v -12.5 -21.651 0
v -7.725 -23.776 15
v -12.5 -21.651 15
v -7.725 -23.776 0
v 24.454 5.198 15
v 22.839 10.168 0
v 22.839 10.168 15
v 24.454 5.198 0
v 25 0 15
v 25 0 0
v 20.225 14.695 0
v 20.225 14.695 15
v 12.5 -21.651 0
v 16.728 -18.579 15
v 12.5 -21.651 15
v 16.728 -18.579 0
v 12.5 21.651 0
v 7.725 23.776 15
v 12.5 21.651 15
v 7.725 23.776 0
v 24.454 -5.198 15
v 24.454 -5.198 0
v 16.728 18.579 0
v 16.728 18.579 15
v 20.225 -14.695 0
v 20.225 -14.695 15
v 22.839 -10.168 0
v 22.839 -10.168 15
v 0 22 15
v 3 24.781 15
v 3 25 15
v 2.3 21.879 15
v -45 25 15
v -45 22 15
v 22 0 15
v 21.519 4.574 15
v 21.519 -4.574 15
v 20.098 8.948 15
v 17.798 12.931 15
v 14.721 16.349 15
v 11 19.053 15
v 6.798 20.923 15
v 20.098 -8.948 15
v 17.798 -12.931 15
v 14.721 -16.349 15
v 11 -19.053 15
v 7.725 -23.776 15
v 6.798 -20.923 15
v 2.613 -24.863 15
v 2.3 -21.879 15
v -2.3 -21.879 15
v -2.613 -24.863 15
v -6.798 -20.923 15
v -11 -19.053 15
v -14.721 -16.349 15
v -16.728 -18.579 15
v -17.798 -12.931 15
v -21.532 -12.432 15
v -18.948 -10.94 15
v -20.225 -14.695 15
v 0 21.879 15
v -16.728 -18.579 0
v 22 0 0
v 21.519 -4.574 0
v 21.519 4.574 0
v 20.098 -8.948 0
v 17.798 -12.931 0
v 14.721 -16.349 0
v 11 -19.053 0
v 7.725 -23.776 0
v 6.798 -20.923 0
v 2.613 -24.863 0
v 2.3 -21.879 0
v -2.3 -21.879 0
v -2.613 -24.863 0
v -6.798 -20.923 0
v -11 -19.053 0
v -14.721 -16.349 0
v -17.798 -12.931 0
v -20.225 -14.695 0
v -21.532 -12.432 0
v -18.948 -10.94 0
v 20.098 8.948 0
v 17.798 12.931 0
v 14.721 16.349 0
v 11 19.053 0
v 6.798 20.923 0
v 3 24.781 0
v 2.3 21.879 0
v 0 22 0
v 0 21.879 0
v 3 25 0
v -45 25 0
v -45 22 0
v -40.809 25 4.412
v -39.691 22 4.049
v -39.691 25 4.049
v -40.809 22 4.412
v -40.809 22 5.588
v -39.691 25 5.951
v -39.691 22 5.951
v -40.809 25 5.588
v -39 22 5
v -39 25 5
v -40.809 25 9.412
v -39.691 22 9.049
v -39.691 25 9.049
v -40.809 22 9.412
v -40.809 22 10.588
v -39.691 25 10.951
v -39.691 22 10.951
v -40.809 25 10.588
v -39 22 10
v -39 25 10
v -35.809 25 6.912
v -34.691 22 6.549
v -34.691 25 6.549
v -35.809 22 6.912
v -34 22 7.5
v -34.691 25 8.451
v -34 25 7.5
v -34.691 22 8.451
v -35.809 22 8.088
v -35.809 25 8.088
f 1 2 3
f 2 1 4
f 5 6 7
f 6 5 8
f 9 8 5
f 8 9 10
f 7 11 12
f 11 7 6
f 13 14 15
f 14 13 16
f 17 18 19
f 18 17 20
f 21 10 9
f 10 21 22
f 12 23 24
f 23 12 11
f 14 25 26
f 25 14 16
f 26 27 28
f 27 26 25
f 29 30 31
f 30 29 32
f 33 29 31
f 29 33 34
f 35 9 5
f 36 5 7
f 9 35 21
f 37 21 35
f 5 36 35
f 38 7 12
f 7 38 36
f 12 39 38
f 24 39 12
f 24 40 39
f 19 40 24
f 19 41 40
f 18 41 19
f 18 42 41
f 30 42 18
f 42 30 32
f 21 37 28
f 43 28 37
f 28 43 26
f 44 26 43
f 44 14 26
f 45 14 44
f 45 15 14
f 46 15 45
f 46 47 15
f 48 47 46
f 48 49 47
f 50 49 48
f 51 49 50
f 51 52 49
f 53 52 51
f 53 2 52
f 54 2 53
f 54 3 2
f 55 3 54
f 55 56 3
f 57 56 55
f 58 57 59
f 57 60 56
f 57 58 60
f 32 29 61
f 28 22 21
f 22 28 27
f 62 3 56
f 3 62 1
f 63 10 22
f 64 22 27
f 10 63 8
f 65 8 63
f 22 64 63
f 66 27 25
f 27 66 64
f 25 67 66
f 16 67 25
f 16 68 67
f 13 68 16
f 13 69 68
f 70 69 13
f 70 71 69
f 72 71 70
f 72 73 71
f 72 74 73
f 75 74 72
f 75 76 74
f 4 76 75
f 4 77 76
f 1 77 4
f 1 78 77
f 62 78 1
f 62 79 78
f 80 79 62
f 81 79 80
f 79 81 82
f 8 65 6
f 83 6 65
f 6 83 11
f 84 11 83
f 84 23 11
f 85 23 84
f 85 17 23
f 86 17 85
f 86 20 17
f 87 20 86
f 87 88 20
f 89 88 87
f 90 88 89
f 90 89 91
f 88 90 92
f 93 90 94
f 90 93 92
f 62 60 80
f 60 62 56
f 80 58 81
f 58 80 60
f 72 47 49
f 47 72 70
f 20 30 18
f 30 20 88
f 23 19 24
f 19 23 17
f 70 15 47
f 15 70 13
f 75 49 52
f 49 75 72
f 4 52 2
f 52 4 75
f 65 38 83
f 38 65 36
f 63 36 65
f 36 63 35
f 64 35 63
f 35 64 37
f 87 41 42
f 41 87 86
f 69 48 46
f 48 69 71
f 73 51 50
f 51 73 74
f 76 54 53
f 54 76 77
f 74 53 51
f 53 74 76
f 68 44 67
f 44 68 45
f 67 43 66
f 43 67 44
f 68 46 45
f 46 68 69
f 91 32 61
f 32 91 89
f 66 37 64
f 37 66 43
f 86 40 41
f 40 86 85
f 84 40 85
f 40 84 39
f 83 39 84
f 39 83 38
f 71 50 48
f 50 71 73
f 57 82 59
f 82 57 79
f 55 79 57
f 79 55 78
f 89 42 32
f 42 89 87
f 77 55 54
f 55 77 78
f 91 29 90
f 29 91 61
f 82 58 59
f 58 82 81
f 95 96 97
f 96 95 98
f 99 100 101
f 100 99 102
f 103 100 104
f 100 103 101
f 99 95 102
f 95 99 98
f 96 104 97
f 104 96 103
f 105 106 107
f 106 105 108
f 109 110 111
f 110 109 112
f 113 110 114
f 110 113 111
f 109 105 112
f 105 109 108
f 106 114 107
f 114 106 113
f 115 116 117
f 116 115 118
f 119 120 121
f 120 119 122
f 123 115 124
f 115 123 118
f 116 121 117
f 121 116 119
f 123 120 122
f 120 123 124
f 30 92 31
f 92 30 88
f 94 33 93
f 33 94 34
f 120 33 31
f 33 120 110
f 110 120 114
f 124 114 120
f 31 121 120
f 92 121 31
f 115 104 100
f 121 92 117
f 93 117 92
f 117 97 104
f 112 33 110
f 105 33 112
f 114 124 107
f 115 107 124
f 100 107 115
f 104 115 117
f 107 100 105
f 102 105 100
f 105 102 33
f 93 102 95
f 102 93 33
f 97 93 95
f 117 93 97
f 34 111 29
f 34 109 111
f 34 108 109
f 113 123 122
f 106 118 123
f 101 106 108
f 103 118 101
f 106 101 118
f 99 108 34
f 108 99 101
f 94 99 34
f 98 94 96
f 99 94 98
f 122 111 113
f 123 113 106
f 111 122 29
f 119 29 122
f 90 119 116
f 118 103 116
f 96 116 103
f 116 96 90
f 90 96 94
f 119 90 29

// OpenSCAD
// Hook type: 1 = wall, 2 = desk
part = 1; // [1,2]

// Overall hook thickness
thickness = 3; // [1:10]
// Width of the hook
depth = 15; // [10:50]
// Hook inner radius
radius = 25; // [10:100]
// How long to make the mounting tabs
tabs = 45; // [20:100]

// For a wall hook, the radius of the nail holes
nails = 1; // [0:4]

// For a desk hook, how thick the desk is
height=25; // [10:50]


// The hook itself
difference() {
    cylinder(r=radius,h=depth);
    translate([0,0,-1]) cylinder(r=radius-thickness,h=depth+2);
    translate([-radius,0,-1]) cube([radius,radius+thickness,depth+2]);
    rotate([0,0,30]) translate([-radius,0,-1]) cube([radius,radius+thickness,depth+2]);
}

// Hook's tab
difference() {
    translate([-tabs,radius-thickness,0]) cube([tabs+thickness,thickness,depth]);
    if (part == 1) {
        translate([-tabs + 5, radius + 5, depth/3]) rotate([90,0,0]) cylinder(r=nails,h=10);
        translate([-tabs + 5, radius + 5, depth*2/3]) rotate([90,0,0]) cylinder(r=nails,h=10);
        translate([-tabs + 10, radius + 5, depth/2]) rotate([90,0,0]) cylinder(r=nails,h=10);
    };
}

// Desk clip
if (part == 2) {
    translate([0,radius-thickness,0]) cube([thickness,height+2*thickness,depth]);
    translate([-tabs,radius+height,0]) cube([tabs+thickness,thickness,depth]);
}
